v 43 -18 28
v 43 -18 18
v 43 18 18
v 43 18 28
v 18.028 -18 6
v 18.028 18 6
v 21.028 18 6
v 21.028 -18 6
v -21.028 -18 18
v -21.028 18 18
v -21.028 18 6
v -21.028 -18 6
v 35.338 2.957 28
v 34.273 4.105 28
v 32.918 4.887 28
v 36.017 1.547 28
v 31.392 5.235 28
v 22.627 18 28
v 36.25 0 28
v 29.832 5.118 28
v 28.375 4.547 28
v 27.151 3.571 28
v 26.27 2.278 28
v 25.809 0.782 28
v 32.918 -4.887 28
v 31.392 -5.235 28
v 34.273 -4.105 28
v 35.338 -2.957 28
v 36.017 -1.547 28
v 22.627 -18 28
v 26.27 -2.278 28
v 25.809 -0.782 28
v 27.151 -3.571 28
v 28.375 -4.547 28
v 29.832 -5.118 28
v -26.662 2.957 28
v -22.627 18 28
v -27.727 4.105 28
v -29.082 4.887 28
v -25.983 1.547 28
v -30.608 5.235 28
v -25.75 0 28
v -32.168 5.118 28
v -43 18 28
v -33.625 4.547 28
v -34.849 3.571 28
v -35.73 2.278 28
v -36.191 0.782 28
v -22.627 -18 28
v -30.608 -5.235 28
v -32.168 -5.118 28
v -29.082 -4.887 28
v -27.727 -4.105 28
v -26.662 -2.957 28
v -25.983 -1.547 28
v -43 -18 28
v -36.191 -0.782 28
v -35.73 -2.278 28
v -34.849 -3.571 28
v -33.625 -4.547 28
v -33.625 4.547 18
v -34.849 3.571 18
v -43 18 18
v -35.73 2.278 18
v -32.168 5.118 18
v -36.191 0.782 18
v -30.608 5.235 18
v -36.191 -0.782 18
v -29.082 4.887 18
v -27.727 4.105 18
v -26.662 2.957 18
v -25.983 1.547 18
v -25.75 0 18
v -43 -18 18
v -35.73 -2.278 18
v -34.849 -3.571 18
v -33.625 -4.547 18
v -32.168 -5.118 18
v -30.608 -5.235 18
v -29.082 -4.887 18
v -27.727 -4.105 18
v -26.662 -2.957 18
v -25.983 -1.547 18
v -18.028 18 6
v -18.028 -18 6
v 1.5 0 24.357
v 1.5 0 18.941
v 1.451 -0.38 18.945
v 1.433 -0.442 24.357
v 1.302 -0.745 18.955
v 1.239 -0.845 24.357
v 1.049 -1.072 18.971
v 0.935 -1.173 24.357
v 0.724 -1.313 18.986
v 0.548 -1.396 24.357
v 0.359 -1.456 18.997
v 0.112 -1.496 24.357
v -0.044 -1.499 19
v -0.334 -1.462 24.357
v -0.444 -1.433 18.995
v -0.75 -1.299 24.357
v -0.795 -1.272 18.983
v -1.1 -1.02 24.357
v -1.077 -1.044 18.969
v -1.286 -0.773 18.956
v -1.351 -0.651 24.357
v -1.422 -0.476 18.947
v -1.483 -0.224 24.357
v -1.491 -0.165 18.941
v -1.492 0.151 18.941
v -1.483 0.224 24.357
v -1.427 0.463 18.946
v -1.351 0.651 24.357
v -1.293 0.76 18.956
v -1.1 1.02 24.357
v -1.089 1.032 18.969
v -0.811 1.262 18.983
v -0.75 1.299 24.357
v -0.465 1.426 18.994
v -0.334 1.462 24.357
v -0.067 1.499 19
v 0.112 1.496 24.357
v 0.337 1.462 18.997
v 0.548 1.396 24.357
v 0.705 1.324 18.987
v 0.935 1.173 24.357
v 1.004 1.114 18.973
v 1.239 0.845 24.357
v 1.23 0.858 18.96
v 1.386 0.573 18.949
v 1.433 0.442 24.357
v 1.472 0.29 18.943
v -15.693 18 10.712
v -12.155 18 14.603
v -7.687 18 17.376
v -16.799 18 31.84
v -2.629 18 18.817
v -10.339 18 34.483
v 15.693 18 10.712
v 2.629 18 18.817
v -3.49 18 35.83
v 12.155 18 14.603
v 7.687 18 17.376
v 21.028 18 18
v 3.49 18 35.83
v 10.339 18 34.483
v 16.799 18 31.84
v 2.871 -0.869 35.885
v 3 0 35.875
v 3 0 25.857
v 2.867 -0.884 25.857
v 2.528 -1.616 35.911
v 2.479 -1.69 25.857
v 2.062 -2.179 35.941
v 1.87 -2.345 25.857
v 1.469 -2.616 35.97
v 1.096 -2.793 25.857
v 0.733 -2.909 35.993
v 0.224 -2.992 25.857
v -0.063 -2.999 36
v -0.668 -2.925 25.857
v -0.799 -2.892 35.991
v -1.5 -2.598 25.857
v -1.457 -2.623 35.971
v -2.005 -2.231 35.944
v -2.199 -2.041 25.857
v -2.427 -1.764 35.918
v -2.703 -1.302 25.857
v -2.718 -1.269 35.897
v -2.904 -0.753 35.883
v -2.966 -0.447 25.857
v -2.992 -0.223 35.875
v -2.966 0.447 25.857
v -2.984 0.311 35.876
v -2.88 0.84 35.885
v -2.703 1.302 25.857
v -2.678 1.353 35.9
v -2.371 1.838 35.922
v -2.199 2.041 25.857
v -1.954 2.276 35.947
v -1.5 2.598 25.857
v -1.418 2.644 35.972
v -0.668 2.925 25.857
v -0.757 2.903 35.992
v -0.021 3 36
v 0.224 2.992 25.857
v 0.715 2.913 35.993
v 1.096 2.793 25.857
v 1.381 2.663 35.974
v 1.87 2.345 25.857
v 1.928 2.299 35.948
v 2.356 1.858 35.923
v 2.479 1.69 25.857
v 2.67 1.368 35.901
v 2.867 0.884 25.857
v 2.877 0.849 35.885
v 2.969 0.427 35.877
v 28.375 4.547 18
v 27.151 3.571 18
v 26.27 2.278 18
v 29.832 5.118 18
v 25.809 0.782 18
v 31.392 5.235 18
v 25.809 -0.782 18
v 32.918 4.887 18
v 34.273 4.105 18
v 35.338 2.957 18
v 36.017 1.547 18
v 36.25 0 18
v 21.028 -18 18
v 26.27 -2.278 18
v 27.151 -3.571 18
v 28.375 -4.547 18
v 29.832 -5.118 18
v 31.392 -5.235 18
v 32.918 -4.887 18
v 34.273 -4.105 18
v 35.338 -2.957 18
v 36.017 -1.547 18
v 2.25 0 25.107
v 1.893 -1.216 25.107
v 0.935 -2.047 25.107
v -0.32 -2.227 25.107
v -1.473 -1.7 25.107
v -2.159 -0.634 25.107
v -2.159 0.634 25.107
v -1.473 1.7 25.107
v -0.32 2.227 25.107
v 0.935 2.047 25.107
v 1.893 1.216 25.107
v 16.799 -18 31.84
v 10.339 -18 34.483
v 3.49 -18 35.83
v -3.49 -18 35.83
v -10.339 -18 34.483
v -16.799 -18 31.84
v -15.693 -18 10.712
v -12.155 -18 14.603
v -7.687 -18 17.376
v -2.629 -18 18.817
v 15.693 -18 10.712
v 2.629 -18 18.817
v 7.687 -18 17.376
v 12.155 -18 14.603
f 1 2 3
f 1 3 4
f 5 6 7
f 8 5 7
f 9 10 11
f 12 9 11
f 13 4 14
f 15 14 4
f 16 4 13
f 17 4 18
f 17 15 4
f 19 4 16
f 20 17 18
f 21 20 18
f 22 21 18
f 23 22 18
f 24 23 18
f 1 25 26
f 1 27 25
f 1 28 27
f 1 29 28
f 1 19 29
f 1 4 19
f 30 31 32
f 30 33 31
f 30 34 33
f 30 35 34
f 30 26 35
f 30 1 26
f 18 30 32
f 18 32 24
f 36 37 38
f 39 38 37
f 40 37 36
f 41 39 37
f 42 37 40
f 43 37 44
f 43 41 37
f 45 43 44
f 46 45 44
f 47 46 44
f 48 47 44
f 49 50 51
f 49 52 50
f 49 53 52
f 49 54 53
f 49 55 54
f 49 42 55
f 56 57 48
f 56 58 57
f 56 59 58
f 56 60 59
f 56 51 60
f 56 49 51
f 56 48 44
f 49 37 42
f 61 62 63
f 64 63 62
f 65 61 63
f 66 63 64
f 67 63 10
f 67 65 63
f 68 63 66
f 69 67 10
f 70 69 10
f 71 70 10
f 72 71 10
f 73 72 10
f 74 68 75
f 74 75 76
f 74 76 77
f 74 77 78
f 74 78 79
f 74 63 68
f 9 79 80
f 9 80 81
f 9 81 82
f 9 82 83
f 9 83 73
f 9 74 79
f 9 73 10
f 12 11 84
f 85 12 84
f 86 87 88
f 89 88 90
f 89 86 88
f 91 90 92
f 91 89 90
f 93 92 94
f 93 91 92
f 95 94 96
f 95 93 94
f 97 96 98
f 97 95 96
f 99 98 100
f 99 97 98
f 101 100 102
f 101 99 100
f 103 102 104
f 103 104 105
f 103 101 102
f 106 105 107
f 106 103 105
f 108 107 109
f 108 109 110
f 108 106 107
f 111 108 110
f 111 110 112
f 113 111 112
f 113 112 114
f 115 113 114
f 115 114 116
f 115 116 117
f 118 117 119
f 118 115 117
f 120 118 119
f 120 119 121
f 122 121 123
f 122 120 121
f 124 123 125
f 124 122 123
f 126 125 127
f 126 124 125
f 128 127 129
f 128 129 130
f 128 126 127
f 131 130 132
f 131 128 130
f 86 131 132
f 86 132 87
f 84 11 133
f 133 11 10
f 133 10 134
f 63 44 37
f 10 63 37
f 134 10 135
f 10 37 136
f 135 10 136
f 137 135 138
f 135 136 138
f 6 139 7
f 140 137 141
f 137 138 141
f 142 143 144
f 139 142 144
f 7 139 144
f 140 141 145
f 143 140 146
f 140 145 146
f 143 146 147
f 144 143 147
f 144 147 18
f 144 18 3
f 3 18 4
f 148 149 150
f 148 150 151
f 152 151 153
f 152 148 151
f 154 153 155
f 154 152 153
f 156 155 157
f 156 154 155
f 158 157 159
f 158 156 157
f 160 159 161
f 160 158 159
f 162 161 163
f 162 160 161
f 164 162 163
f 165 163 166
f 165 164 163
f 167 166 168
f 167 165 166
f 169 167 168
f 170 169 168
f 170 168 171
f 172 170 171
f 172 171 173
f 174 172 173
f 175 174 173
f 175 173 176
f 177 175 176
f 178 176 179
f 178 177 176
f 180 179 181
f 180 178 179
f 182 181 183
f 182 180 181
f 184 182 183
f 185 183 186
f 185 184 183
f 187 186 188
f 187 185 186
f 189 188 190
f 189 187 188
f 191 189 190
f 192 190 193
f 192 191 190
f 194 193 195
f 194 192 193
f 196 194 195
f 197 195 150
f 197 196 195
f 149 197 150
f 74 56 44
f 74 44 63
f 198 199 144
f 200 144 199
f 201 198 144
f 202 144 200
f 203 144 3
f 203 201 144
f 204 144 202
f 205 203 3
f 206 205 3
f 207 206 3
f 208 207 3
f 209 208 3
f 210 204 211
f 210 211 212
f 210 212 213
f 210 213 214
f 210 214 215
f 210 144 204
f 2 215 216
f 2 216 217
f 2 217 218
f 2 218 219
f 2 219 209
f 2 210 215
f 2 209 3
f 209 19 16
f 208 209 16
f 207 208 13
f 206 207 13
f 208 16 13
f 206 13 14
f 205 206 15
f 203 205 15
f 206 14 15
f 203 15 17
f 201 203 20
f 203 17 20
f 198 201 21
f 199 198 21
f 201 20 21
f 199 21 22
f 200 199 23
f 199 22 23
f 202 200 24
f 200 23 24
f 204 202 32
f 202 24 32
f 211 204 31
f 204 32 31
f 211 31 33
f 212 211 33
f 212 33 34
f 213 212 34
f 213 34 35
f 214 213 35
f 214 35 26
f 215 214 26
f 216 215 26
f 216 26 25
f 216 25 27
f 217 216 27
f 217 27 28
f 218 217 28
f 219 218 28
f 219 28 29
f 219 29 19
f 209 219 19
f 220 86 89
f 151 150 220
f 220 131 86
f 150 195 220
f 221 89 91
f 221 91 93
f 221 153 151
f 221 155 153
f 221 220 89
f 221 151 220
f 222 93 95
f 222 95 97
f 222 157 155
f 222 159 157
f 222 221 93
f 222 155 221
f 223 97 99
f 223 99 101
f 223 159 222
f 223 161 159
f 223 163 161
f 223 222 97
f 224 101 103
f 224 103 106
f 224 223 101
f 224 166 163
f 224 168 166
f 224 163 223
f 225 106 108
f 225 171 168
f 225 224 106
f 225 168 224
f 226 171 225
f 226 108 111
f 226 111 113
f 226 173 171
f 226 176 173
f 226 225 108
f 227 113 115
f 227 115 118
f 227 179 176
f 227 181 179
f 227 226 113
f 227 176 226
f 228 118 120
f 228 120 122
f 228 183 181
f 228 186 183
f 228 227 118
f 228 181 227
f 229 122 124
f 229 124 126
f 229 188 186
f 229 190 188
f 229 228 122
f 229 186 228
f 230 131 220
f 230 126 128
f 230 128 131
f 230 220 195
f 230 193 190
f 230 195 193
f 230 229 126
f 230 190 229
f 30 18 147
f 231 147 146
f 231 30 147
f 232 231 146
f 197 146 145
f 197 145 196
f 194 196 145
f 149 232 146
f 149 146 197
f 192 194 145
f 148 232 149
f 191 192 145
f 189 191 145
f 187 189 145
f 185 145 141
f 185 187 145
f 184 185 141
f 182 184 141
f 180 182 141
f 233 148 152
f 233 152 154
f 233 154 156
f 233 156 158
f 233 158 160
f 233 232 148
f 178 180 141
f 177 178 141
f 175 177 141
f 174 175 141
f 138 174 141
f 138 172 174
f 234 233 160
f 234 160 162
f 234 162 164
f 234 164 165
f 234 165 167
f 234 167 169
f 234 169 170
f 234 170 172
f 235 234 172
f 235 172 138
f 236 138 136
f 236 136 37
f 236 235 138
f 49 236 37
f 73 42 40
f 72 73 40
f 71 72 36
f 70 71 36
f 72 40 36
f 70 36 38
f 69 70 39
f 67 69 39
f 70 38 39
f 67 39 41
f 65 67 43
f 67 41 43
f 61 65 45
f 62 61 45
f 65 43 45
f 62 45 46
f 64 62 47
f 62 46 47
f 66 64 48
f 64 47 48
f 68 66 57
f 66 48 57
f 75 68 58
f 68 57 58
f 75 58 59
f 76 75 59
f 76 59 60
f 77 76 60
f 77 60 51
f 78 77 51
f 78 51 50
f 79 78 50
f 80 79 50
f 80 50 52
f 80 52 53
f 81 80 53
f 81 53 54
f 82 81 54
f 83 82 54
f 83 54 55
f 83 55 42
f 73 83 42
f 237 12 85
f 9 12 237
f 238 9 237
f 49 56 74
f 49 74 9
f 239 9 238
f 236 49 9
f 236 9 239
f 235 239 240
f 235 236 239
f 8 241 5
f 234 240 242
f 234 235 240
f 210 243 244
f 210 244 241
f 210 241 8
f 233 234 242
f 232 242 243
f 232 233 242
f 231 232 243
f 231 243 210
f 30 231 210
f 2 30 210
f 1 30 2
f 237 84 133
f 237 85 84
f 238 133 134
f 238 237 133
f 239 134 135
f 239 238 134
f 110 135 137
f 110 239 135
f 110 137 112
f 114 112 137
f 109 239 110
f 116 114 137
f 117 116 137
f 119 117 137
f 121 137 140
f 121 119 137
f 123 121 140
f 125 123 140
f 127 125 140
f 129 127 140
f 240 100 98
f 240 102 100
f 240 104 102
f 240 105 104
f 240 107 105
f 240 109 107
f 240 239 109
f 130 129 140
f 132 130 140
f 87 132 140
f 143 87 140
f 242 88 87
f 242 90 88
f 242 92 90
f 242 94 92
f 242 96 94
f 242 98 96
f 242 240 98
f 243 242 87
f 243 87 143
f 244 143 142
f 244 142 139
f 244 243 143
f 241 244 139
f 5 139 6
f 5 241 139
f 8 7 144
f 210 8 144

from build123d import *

# Parameters (mm, degrees)
F1_DEPTH = 18
F2_R     = 5.25
F3_DEPTH = 25


with BuildPart() as f1:
    # F0 (on Front) → F1 (new body, symmetric)
    with BuildSketch(Plane.XZ):
        with BuildLine():
            ThreePointArc((-18.027756, 6), (0, 19), (18.027756, 6))
            Line((18.027756, 6), (21.027756, 6))
            Line((21.027756, 6), (21.027756, 18))
            Line((21.027756, 18), (43, 18))
            Line((43, 18), (43, 28))
            Line((43, 28), (22.627417, 28))
            ThreePointArc((22.627417, 28), (0, 36), (-22.627417, 28))
            Line((-22.627417, 28), (-43, 28))
            Line((-43, 28), (-43, 18))
            Line((-43, 18), (-21.027756, 18))
            Line((-21.027756, 18), (-21.027756, 6))
            Line((-21.027756, 6), (-18.027756, 6))
        make_face()
    extrude(amount=F1_DEPTH, both=True)

    # F2 (on face) → F3 (cut)
    with BuildSketch(Plane.XY.offset(28)):
        with Locations((-31, 0)):
            Circle(F2_R)
        with Locations((31, 0)):
            Circle(F2_R)
    extrude(amount=-F3_DEPTH, mode=Mode.SUBTRACT)

    # F4 (on Front) → F5 (revolve, cut)
    with BuildSketch(Plane.XZ):
        Polygon((3, 40.073246), (0, 40.122432), (0, 17.161723), (1.5, 17.161723), (1.5, 24.356959), (3, 25.856959), align=None)
    revolve(axis=Axis((0, 0, 25.428471), (0, 0, -1)), mode=Mode.SUBTRACT)


solid = f1.part
